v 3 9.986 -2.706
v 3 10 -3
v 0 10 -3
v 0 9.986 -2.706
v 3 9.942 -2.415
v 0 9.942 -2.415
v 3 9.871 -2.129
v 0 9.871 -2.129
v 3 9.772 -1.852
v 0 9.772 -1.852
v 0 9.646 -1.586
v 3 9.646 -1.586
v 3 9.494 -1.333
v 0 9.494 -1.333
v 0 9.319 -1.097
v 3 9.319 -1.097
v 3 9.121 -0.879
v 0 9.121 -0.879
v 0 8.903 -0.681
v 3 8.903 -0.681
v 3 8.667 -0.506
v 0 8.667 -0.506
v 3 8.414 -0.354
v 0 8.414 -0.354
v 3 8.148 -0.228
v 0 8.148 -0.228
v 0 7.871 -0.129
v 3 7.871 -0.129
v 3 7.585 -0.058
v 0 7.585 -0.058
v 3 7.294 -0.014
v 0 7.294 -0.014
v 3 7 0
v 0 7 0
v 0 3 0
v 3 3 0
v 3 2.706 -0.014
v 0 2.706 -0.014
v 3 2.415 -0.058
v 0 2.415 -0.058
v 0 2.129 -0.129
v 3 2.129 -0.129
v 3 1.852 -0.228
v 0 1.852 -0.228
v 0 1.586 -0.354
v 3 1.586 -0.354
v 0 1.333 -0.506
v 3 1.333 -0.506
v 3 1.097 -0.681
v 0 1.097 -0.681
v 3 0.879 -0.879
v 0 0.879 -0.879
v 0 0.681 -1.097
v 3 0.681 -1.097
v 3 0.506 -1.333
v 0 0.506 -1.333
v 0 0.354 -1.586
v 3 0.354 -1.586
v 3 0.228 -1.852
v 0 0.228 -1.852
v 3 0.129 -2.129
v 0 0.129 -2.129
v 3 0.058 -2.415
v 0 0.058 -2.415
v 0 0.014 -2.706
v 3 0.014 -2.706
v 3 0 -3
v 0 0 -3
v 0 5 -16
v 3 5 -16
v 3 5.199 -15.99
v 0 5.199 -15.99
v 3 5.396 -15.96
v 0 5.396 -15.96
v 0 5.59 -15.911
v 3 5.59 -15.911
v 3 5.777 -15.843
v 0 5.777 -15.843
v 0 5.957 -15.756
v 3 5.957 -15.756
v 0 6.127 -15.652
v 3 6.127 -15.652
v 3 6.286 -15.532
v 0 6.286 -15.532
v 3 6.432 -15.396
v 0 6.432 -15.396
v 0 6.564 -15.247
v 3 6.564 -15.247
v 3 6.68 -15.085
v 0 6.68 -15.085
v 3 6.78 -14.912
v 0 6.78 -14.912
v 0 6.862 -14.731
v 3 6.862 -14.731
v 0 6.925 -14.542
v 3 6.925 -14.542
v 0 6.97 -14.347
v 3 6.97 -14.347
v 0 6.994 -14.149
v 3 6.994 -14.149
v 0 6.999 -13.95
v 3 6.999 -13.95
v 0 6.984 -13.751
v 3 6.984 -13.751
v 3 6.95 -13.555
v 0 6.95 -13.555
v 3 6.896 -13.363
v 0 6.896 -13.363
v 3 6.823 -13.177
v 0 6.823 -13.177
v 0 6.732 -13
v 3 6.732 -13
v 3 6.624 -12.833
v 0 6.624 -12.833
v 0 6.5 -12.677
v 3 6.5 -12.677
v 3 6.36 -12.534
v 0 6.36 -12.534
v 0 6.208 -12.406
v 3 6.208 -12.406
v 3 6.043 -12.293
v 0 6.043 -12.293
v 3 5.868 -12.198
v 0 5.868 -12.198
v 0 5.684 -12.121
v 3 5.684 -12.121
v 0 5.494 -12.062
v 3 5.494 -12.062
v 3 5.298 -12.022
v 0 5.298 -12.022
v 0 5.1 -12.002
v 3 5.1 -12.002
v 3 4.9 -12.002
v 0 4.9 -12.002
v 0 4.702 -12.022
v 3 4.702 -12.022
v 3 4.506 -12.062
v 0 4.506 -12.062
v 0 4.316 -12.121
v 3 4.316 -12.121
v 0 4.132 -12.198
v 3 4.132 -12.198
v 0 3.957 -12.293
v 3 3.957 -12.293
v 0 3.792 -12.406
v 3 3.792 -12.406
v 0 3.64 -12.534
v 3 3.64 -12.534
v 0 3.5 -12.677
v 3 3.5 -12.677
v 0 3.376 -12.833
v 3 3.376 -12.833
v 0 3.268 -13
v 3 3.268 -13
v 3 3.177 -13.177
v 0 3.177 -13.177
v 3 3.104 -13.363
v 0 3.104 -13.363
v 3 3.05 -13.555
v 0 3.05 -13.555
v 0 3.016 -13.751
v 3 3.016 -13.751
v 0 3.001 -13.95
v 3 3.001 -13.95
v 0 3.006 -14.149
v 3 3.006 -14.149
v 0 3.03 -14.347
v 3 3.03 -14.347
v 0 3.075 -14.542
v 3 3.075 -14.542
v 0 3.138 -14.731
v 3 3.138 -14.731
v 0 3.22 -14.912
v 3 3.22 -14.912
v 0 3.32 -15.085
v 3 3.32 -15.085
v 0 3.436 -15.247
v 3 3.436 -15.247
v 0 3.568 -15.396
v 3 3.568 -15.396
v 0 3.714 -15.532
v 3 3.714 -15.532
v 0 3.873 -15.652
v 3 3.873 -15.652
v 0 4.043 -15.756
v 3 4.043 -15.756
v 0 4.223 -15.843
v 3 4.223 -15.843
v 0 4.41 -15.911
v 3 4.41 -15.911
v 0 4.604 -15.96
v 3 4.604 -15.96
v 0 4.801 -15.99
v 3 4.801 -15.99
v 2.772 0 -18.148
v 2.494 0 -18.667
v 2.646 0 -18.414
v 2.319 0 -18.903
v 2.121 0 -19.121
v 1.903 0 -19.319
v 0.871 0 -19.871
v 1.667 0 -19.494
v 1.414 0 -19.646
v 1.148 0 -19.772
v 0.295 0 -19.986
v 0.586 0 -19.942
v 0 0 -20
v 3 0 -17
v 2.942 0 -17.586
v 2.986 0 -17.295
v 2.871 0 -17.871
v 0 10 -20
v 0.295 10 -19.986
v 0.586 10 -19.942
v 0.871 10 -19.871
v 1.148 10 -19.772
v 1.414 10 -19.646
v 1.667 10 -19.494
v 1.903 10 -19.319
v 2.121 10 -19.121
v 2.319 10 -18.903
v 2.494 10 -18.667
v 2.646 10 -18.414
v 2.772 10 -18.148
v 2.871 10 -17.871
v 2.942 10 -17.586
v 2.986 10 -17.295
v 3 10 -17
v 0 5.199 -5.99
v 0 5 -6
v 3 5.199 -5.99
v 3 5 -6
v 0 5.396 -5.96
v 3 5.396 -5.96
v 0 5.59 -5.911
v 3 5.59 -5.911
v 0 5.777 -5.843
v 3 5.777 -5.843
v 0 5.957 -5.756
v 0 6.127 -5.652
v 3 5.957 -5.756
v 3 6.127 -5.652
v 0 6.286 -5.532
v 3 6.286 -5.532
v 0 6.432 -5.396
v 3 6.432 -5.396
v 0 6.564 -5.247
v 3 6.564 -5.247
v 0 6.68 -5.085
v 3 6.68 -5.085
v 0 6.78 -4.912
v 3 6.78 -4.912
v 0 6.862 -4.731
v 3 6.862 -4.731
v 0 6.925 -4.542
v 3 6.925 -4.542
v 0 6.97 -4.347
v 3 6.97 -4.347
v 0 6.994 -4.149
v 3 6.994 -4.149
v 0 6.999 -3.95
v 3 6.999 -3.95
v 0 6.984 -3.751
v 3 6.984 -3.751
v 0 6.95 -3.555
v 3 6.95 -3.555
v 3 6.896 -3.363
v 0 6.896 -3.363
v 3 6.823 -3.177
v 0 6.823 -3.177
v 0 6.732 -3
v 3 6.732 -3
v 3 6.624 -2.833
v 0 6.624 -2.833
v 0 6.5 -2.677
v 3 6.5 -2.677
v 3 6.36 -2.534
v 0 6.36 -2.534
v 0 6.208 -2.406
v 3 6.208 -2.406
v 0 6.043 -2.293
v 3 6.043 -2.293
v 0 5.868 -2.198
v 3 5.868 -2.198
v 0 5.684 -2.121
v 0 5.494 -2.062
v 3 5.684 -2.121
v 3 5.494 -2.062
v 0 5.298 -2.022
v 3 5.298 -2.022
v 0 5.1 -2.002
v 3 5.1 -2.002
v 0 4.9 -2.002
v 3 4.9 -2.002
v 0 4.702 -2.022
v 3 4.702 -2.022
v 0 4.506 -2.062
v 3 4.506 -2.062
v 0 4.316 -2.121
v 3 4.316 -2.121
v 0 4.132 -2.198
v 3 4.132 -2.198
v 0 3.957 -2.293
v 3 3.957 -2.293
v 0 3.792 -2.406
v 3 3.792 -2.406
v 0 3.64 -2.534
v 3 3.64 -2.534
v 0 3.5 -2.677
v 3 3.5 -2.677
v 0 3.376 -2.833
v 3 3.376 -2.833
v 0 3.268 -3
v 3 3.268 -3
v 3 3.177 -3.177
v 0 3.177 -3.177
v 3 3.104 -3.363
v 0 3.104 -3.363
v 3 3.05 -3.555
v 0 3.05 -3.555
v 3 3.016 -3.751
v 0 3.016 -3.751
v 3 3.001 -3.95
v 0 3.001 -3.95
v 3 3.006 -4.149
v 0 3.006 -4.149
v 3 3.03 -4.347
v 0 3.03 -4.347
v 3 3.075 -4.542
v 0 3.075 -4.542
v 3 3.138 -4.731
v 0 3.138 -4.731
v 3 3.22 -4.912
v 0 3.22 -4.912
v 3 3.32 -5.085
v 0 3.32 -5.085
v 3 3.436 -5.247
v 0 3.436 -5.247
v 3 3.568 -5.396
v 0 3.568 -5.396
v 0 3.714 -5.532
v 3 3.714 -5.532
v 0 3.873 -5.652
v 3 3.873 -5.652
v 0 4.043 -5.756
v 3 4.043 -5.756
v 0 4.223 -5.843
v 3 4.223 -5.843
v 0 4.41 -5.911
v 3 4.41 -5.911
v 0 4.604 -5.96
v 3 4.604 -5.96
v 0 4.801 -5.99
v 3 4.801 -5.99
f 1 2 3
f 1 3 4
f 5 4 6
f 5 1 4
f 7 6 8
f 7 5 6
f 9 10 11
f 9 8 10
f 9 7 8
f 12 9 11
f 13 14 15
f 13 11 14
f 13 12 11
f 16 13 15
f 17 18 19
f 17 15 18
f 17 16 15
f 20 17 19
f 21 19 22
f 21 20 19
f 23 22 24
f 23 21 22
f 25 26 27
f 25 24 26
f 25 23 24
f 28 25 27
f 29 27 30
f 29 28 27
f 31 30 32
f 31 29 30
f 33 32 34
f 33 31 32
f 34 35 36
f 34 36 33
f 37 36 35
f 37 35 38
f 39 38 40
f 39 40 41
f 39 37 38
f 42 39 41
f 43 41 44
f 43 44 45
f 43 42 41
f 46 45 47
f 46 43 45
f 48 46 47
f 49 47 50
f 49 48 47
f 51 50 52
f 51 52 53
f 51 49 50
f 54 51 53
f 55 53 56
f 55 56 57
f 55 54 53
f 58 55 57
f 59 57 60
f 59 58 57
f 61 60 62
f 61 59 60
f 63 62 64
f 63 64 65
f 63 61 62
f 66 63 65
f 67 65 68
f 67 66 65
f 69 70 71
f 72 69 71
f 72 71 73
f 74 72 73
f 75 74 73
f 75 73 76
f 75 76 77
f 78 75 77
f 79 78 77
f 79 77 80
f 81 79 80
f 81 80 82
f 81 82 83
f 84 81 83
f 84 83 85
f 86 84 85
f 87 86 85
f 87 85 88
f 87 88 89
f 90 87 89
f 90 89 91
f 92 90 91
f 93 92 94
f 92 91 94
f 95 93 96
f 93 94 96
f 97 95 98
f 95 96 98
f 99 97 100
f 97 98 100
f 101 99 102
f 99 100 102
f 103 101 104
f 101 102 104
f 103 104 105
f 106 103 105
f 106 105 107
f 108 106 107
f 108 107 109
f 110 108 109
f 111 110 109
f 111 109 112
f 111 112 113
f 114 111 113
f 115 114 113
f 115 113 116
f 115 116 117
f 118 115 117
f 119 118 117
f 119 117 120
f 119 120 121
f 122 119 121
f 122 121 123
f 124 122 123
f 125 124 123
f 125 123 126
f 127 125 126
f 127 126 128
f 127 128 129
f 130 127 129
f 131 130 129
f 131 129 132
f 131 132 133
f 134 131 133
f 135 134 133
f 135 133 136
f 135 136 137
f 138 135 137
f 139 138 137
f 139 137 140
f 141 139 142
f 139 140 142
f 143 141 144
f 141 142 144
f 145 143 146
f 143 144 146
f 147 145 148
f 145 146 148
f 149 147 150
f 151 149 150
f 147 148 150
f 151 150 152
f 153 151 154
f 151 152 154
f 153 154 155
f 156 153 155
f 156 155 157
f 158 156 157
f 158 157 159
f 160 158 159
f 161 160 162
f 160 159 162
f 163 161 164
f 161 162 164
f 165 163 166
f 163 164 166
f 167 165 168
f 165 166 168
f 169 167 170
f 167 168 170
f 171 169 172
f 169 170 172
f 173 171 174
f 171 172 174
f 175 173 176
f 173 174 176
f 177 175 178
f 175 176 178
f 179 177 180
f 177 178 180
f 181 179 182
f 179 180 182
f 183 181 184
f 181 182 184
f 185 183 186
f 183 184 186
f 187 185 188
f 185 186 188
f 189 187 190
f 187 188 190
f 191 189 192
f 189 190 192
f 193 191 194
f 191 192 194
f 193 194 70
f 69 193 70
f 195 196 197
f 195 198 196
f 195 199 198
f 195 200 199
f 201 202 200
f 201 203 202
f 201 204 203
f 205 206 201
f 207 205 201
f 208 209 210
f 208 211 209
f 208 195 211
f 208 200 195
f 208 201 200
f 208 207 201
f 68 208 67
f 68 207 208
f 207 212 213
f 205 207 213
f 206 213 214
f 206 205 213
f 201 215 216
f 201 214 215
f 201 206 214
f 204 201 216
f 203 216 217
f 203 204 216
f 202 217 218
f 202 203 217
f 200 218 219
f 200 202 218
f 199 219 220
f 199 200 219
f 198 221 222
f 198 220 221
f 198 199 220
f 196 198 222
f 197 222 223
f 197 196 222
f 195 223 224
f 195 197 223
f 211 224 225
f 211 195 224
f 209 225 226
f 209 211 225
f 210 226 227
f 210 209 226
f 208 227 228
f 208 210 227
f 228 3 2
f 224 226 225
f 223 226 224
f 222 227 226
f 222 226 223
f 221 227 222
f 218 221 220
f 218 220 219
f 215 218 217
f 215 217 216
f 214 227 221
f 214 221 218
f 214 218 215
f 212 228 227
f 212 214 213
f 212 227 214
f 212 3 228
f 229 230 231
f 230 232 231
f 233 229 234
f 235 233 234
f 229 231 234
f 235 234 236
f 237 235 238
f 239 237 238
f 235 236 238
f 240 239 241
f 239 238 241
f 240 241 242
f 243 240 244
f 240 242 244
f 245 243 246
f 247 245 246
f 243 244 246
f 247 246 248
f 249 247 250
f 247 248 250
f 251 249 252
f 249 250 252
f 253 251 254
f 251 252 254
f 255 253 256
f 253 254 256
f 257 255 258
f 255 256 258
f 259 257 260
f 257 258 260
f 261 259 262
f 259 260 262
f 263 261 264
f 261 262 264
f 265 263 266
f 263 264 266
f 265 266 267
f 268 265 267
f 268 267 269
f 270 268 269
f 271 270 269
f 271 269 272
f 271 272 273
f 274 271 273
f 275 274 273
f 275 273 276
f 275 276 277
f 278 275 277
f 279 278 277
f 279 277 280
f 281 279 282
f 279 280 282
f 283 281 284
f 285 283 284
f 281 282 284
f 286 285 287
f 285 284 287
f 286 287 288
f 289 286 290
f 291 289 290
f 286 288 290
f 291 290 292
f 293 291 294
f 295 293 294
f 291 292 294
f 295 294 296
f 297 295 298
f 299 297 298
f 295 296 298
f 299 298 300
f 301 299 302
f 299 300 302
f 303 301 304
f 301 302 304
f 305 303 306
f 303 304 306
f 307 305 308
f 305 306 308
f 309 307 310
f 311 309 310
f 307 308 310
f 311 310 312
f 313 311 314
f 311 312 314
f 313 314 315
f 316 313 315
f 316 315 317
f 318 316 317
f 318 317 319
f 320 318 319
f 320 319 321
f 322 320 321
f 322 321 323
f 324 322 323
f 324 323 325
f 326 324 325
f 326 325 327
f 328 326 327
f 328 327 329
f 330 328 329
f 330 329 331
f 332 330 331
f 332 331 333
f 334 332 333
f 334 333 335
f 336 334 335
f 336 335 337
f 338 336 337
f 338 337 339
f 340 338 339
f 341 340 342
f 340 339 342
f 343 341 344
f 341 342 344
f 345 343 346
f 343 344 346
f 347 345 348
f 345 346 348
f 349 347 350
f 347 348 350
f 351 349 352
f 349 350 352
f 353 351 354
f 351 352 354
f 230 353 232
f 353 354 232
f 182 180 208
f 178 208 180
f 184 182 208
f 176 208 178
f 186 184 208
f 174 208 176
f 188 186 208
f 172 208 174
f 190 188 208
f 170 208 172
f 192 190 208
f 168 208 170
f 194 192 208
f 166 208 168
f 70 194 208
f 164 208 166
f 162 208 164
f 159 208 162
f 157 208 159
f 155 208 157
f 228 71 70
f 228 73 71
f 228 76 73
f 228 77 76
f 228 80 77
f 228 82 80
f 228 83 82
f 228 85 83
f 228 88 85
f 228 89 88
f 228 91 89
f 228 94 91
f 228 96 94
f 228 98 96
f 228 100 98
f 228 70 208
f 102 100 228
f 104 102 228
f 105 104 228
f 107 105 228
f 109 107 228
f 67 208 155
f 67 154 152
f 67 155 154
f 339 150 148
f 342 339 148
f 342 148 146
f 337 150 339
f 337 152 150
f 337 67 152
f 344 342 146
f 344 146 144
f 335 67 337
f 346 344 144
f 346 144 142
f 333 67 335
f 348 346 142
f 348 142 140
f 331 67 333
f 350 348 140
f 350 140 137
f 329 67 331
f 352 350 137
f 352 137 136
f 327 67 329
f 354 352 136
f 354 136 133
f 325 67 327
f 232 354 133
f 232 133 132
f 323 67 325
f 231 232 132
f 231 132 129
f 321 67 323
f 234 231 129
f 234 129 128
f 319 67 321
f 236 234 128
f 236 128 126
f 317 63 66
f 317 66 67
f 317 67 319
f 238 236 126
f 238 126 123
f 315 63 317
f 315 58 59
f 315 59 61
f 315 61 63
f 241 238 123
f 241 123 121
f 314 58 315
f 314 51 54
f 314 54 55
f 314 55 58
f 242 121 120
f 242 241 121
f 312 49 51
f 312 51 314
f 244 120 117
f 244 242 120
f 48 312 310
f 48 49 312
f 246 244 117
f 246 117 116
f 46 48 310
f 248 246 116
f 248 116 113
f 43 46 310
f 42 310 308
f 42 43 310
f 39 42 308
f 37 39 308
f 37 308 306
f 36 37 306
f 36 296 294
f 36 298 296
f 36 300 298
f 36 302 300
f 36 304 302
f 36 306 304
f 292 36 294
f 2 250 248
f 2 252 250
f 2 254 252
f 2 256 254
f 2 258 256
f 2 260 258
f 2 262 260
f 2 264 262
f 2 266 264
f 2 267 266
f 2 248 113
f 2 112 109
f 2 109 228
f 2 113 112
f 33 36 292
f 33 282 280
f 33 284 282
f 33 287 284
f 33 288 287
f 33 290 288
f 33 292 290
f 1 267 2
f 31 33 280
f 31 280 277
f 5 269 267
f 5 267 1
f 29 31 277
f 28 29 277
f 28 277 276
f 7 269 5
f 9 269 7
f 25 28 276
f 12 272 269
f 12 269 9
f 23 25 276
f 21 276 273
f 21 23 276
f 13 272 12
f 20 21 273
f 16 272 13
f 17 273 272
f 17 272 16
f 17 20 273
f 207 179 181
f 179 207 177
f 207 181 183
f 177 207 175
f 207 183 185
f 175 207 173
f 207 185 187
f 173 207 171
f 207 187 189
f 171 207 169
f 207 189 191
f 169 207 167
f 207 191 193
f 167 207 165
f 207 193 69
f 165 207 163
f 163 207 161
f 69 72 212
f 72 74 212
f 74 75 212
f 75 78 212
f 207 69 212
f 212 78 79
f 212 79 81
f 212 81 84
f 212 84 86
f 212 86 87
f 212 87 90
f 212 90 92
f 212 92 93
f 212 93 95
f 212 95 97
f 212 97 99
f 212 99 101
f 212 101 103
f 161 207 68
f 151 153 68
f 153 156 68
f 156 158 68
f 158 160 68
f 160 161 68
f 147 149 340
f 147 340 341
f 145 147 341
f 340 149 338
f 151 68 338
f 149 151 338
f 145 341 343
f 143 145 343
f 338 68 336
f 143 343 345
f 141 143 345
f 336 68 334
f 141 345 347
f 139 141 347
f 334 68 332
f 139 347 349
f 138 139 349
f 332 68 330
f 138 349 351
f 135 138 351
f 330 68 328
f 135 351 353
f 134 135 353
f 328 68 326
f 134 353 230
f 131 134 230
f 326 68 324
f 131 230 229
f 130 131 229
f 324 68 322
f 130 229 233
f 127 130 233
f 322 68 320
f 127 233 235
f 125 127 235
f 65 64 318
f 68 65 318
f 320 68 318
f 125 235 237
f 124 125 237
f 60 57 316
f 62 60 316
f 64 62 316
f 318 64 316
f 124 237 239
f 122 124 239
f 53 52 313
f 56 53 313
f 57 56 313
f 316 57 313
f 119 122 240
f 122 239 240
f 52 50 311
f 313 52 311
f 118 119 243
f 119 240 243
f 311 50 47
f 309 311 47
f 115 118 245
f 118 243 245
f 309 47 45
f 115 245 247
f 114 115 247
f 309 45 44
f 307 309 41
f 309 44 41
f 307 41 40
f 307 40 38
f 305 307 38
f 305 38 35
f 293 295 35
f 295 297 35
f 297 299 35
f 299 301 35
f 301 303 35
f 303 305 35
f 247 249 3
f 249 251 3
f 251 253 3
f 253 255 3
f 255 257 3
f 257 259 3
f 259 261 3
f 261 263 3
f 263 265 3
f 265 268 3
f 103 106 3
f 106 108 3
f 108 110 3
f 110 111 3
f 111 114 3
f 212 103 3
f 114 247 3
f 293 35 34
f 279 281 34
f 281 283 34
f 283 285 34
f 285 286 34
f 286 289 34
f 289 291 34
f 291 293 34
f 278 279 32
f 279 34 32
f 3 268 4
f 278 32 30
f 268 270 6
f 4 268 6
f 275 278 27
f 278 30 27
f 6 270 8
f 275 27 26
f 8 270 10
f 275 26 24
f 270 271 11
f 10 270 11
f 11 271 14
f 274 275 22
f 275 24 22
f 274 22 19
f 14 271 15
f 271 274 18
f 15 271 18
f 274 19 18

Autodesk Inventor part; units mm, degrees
ref_plane "YZ Plane" through (0, 0, 0) normal (1, 0, 0) x (0, 1, 0)
ref_plane "XZ Plane" through (0, 0, 0) normal (0, 1, 0) x (-1, 0, 0)
ref_plane "XY Plane" through (0, 0, 0) normal (0, 0, 1) x (1, 0, 0)
sketch "Sketch1" plane through (0, 0, 0) normal (1, 0, 0) x (0, 1, 0)
  point P0 (0, 0)
sketch "Sketch2" plane through (0, 0, 0) normal (1, 0, 0) x (0, 1, 0)
  line L0 (0, 0) -> (10, 0)
  line L1 (10, 0) -> (10, -20)
  line L2 (10, -20) -> (0, -20)
  line L3 (0, -20) -> (0, 0)
  dimension "d0" = 10
  dimension "d1" = 20
extrude "Extrusion1" add sketch "Sketch2" along normal blind 3
fillet "Fillet1" radius 3 1 edges at (1.5, 10, 0)
fillet "Fillet2" radius 3 1 edges at (1.5, 0, 0)
fillet "Fillet3" radius 3 1 edges at (3, 5, -20)
sketch "Sketch3" plane through (3, 0, 0) normal (1, 0, 0) x (0, 0, -1)
  circle A0 centre (4, 5) radius 2
  point P0 (0, 0)
  dimension "d14" = 4
extrude "Extrusion2" cut sketch "Sketch3" against normal blind 3
sketch "Sketch4" plane through (3, 0, 0) normal (1, 0, 0) x (0, 0, -1)
  circle A0 centre (14, 5) radius 2
  point P0 (0, 0)
  dimension "d10" = 4
extrude "Extrusion3" cut sketch "Sketch4" against normal blind 3
properties part number "holder 1"
